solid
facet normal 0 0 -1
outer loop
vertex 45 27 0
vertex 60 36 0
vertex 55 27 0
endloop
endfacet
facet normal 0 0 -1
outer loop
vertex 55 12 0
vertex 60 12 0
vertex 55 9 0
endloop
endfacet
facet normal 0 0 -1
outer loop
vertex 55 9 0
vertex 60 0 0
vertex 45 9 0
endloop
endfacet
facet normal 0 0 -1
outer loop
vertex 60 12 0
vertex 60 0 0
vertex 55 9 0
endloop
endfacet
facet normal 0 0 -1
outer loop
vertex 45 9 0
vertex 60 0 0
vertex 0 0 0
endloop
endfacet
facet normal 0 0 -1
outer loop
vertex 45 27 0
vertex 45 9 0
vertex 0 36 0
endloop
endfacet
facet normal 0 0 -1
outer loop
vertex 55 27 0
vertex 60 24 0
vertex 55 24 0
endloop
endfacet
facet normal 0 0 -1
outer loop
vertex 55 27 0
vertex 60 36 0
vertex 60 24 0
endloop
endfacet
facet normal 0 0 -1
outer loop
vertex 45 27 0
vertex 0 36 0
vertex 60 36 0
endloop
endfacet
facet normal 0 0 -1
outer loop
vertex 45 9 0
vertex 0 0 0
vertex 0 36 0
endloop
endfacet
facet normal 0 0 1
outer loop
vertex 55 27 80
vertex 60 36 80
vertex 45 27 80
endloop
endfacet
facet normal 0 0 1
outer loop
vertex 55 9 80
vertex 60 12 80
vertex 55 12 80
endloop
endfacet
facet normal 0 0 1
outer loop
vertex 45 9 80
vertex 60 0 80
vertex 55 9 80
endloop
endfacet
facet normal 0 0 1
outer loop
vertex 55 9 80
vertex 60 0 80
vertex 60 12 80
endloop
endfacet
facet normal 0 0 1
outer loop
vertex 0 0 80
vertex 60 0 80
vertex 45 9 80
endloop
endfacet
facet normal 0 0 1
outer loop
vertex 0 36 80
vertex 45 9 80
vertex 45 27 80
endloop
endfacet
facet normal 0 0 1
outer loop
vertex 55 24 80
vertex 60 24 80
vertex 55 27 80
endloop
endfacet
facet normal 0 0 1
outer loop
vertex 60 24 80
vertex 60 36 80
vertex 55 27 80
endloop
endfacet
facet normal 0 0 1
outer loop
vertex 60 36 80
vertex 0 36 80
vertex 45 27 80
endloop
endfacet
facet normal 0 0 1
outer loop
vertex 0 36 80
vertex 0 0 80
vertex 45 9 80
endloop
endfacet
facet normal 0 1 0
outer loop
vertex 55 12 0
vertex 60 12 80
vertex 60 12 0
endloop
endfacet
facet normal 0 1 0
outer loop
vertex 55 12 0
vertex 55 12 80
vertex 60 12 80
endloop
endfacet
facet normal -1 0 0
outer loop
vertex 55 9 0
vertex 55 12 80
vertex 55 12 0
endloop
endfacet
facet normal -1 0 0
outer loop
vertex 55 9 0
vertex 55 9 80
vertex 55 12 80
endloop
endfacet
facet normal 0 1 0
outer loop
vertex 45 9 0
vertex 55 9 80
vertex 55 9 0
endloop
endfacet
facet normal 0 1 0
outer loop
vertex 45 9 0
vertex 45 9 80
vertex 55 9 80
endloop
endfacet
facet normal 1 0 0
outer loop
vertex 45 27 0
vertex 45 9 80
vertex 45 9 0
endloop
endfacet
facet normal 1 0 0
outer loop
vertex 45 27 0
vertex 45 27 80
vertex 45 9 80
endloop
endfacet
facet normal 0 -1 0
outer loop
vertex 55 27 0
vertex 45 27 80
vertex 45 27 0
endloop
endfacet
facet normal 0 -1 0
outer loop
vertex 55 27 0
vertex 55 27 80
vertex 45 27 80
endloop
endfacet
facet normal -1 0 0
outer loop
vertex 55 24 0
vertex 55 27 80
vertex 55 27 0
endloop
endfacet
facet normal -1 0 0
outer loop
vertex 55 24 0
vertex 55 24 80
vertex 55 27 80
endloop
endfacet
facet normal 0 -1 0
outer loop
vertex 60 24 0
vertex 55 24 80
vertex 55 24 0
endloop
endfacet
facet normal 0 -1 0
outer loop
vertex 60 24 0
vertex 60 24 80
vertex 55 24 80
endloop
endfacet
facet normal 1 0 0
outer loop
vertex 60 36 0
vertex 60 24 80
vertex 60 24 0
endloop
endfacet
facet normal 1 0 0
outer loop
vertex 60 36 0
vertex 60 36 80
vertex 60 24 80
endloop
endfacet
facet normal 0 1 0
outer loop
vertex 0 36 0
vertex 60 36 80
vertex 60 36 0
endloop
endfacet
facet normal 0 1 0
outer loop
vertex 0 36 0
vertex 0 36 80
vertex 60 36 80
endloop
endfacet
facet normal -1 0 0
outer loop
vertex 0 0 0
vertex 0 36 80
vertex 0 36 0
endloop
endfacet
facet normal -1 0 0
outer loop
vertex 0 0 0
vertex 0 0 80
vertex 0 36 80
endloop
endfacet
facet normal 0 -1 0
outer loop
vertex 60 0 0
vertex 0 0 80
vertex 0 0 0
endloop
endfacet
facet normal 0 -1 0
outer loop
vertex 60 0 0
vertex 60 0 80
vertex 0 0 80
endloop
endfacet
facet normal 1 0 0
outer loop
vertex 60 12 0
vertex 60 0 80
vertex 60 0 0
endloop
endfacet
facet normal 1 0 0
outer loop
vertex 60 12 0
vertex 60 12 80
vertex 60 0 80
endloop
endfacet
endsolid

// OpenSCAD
$fn = 32;

// ----------------------------------------------------------------------
// T-slot rail: 60 x 36 mm section, 80 mm long
// ----------------------------------------------------------------------

// --- parameters (mm) ---
profile_height = 80;      // extrusion height
profile_points = 12;      // points of the closed outline

profile = [[0, 0], [60, 0], [60, 12], [55, 12], [55, 9], [45, 9], [45, 27], [55, 27], [55, 24], [60, 24], [60, 36], [0, 36]];  // single closed polygon, 12 points, counter clockwise

// --- the one profile operation ---
linear_extrude(height = profile_height) polygon(points = profile);
